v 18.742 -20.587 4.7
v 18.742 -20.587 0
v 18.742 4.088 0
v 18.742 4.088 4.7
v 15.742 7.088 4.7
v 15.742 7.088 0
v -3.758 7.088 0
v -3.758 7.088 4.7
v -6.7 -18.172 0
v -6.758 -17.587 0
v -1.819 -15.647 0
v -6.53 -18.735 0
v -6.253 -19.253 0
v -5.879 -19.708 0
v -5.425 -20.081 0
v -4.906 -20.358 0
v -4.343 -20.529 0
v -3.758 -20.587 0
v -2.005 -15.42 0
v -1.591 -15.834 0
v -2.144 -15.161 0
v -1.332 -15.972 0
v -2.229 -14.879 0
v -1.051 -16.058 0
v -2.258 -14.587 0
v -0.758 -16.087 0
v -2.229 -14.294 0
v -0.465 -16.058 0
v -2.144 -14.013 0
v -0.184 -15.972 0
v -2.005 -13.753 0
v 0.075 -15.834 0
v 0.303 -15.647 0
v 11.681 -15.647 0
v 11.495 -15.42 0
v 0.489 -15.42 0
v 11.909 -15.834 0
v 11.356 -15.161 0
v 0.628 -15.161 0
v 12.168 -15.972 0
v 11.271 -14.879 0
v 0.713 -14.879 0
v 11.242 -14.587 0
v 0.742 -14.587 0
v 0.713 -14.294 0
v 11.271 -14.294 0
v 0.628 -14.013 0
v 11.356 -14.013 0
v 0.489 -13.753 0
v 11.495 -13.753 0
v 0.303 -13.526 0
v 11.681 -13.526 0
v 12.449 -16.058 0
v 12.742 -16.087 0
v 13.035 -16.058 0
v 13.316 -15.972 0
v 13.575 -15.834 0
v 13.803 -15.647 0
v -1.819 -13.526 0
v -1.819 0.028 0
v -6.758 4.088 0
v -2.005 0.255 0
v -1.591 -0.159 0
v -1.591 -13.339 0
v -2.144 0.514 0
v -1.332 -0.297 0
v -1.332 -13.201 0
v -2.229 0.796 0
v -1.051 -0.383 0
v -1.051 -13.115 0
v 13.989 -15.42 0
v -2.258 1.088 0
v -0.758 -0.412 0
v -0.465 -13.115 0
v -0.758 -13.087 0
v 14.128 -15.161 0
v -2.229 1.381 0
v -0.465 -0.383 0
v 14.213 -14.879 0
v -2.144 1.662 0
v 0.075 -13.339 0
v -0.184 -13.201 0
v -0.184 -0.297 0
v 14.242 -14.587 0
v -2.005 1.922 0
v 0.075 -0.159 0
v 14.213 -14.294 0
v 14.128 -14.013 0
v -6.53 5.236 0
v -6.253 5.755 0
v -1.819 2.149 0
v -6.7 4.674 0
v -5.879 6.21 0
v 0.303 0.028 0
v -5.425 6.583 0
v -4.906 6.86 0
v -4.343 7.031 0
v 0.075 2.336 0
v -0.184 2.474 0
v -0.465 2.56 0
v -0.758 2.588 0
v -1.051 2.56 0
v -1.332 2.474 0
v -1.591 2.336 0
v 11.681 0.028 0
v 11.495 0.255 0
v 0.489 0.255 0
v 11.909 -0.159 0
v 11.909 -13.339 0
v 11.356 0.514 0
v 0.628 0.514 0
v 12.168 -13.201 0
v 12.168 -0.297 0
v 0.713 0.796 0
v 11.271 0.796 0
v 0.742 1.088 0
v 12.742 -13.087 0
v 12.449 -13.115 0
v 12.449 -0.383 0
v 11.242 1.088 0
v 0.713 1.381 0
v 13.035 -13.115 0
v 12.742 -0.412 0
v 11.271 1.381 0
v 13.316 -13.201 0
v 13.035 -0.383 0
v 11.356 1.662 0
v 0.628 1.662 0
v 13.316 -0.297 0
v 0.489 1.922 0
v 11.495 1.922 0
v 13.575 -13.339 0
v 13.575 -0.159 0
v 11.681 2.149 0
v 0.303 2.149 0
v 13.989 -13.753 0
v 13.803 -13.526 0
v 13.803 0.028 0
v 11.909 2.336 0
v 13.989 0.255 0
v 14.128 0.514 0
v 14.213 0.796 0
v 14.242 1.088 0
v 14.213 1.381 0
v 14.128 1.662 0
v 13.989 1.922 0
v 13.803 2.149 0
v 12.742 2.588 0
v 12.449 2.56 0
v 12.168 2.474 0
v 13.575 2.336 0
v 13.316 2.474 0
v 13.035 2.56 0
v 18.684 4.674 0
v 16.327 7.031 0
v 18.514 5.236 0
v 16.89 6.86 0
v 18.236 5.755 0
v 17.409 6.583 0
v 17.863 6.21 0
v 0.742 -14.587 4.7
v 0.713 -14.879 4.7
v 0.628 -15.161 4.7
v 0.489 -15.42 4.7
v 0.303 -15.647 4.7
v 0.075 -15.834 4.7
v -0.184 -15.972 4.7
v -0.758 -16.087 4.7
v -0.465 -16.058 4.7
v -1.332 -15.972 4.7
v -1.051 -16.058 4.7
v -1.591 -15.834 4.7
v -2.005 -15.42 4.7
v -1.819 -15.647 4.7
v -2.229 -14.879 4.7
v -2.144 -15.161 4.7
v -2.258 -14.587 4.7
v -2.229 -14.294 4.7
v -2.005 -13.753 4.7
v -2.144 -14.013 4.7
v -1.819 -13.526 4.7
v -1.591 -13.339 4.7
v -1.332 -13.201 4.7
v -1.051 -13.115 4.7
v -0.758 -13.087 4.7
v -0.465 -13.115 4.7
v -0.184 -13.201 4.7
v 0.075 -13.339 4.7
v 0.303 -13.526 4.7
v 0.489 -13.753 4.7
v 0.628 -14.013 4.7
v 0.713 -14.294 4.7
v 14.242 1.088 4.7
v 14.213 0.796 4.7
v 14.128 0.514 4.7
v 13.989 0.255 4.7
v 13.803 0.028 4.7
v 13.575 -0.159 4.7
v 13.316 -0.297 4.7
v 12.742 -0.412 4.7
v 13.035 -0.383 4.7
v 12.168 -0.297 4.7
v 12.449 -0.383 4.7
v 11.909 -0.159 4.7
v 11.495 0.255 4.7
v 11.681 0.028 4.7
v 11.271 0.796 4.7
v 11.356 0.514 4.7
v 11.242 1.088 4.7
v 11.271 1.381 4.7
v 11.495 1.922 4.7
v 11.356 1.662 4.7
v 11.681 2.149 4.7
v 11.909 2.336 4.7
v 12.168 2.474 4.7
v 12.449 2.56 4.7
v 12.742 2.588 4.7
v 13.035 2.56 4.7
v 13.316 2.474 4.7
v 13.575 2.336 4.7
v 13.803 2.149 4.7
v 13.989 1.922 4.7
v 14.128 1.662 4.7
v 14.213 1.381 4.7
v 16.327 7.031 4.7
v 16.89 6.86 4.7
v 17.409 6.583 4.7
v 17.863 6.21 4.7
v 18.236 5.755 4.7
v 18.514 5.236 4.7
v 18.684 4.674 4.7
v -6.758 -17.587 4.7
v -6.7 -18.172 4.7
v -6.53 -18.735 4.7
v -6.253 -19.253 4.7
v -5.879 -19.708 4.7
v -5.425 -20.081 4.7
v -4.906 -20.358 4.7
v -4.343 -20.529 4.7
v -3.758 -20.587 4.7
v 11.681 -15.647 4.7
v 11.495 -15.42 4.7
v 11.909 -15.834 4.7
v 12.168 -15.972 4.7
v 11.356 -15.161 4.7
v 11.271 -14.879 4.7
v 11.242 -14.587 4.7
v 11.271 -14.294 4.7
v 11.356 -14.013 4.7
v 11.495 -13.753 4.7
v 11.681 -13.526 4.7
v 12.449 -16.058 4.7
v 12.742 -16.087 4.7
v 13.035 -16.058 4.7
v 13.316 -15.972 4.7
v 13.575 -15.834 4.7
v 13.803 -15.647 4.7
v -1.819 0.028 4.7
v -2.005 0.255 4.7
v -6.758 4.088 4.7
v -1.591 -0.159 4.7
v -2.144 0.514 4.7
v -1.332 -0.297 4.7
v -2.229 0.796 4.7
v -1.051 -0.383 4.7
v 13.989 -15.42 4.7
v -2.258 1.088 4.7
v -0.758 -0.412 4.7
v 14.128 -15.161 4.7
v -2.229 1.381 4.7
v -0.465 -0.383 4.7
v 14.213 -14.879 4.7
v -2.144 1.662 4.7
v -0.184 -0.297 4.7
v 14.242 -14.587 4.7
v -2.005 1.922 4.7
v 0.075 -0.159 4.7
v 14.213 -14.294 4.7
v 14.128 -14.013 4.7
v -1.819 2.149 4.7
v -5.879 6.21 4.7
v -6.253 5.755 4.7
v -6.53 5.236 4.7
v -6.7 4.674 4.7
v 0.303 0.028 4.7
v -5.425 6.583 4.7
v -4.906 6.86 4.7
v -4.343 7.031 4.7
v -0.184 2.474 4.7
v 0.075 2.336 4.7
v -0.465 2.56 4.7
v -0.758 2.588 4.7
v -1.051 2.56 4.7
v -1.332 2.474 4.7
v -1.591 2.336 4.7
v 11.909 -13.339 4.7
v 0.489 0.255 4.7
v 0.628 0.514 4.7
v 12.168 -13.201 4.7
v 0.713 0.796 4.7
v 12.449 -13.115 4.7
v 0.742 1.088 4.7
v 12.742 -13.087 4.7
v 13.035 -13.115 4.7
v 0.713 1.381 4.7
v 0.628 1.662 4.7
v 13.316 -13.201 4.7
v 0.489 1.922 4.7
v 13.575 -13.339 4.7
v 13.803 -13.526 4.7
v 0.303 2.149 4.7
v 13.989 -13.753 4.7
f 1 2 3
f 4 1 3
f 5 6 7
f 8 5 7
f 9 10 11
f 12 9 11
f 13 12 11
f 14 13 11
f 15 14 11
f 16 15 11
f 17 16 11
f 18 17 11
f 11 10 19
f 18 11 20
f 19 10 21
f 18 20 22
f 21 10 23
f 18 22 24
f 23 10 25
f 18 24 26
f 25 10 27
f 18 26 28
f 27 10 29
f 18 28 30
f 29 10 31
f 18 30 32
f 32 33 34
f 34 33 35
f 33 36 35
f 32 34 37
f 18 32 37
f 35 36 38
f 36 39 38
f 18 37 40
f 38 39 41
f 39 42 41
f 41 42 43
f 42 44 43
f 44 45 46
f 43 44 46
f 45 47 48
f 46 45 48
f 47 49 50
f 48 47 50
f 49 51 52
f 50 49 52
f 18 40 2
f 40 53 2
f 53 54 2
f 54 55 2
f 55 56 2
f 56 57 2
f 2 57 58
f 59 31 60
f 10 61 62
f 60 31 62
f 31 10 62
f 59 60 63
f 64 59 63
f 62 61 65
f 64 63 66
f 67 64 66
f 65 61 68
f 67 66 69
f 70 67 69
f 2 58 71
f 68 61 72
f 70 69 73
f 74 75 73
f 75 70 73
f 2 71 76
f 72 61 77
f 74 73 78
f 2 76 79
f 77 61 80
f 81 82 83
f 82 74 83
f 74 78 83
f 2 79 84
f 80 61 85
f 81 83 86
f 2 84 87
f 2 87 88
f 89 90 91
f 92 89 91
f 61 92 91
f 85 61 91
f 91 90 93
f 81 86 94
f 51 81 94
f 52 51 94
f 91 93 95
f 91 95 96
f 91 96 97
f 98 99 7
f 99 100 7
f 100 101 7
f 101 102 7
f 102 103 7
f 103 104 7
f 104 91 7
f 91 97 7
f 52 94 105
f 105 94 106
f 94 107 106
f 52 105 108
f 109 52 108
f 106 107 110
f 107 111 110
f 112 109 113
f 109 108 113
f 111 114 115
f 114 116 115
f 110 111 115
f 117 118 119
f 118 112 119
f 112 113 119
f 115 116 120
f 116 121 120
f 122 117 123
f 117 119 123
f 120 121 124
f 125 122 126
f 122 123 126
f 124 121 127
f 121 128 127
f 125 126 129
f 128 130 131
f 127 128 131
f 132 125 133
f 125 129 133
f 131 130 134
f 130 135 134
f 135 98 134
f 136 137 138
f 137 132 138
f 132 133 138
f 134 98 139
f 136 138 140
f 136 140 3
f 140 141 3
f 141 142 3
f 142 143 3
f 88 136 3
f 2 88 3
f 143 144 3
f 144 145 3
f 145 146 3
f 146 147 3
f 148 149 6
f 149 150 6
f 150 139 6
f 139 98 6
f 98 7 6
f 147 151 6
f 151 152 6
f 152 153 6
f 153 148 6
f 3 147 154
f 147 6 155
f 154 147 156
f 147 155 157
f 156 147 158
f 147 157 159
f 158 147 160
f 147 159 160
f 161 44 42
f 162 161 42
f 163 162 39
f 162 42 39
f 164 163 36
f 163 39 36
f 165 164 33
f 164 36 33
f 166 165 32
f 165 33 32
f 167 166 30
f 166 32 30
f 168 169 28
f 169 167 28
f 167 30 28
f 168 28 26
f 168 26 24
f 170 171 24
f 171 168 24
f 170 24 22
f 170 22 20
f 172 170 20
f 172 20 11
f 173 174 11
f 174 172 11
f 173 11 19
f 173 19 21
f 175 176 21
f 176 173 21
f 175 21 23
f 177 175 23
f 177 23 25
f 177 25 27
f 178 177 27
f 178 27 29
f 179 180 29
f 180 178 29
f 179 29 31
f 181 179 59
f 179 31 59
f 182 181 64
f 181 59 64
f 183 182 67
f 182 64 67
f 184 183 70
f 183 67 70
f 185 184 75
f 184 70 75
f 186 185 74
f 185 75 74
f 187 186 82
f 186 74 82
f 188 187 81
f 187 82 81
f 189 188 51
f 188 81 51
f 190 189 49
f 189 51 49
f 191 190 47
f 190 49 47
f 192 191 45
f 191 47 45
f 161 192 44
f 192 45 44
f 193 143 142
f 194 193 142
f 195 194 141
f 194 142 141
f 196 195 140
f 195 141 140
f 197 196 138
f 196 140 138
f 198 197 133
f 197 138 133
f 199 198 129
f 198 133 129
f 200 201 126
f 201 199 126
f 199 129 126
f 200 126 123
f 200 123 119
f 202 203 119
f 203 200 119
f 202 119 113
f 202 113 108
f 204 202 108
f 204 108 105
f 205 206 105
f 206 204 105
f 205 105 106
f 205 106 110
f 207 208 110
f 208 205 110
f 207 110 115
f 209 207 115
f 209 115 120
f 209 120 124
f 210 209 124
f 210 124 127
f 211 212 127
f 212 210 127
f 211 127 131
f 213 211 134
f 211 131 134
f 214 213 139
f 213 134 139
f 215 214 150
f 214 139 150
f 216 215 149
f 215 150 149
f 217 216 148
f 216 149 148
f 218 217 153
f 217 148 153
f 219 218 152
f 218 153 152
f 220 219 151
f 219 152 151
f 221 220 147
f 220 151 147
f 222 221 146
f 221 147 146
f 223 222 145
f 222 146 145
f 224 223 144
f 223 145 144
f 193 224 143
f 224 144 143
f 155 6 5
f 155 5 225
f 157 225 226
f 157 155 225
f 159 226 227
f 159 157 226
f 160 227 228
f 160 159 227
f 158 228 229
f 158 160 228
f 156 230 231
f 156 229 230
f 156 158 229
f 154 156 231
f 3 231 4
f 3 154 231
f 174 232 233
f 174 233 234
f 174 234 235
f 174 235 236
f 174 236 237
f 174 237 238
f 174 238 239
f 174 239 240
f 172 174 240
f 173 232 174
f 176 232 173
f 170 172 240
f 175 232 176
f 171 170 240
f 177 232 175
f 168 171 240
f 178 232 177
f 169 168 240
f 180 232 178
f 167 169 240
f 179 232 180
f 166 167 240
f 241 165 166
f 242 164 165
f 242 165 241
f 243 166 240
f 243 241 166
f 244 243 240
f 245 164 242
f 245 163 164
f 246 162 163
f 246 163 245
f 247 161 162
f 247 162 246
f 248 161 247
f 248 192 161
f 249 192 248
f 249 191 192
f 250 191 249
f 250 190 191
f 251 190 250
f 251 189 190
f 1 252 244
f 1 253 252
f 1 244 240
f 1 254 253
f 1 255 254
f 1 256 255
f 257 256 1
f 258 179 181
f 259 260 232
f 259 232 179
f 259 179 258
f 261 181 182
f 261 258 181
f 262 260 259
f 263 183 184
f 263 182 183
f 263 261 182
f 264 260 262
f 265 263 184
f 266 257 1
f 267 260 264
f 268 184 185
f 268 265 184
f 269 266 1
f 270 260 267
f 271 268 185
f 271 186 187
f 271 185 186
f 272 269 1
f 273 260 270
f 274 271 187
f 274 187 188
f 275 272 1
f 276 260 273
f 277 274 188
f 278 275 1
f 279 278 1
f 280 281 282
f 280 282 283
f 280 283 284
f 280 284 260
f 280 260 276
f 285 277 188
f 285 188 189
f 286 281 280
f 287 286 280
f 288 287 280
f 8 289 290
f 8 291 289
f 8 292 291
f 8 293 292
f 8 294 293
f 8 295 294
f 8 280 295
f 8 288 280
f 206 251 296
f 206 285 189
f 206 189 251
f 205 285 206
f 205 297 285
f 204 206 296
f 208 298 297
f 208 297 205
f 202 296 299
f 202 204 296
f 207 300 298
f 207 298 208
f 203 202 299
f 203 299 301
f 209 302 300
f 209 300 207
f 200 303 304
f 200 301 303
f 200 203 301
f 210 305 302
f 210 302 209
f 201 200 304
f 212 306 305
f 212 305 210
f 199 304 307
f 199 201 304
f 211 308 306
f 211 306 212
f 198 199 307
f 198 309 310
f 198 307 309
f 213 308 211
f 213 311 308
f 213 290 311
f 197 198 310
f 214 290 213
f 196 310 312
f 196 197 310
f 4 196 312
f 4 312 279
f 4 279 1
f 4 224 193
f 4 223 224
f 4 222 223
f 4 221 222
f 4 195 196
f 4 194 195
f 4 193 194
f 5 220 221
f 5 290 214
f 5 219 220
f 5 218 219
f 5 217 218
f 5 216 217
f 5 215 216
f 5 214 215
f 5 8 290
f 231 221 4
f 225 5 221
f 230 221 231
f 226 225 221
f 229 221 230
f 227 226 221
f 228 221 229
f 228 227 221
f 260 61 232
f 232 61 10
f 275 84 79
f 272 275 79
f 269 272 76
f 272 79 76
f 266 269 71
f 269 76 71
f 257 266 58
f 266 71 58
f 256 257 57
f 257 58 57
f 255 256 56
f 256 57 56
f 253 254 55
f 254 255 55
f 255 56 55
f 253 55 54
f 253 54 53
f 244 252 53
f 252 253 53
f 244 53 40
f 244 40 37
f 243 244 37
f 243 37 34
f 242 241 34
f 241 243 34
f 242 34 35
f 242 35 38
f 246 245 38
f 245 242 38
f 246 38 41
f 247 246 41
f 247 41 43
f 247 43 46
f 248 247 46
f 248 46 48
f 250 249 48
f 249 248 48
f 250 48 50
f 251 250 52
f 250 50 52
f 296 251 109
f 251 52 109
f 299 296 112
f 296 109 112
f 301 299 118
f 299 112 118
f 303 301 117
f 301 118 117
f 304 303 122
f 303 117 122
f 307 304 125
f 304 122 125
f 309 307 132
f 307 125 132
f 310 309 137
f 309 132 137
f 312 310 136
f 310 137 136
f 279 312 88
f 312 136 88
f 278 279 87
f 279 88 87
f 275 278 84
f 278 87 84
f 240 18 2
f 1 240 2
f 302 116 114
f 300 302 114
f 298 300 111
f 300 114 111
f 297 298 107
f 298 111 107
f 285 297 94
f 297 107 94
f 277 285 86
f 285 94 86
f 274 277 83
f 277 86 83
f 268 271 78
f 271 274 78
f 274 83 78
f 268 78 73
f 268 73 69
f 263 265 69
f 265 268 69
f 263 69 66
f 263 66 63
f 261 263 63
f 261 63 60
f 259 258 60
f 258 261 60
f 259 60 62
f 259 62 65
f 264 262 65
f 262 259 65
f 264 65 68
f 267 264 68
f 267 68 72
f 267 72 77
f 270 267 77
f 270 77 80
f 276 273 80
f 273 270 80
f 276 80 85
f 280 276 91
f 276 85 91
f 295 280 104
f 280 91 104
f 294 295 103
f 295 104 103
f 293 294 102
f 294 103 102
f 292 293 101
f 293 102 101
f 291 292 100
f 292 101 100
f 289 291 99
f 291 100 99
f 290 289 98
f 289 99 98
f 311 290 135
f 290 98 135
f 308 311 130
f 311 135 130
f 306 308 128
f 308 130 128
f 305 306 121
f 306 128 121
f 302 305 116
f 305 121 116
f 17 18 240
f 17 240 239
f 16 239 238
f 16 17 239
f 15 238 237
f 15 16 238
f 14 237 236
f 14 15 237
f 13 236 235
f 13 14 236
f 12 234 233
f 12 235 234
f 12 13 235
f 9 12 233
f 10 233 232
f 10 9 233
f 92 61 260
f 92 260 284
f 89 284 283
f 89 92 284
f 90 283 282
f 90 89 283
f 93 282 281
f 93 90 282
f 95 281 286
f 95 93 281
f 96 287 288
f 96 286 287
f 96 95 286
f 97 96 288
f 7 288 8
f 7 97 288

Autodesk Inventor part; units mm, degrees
ref_plane "YZ Plane" through (0, 0, 0) normal (1, 0, 0) x (0, 1, 0)
ref_plane "XZ Plane" through (0, 0, 0) normal (0, 1, 0) x (-1, 0, 0)
ref_plane "XY Plane" through (0, 0, 0) normal (0, 0, 1) x (1, 0, 0)
sketch "Szkic1" plane through (0, 0, 0) normal (0, 0, 1) x (1, 0, 0)
  arc A0 (18.7419, 4.0884) -> (15.7419, 7.0884) centre (15.7419, 4.0884) ccw
  line L0 (15.7419, 7.0884) -> (-3.7581, 7.0884)
  arc A1 (-3.7581, 7.0884) -> (-6.7581, 4.0884) centre (-3.7581, 4.0884) ccw
  line L1 (-6.7581, 4.0884) -> (-6.7581, -17.5866)
  arc A2 (-6.7581, -17.5866) -> (-3.7581, -20.5866) centre (-3.7581, -17.5866) ccw
  line L2 (-3.7581, -20.5866) -> (18.7419, -20.5866)
  line L3 (18.7419, -20.5866) -> (18.7419, 4.0884)
  circle A3 centre (12.7419, -14.5866) radius 1.5
  circle A4 centre (12.7419, 1.0884) radius 1.5
  circle A5 centre (-0.7581, 1.0884) radius 1.5
  circle A6 centre (-0.7581, -14.5866) radius 1.5
  point P0 (0, 0)
  point P1 (0, 0)
extrude "Wyciągnięcie proste1" add sketch "Szkic1" along normal blind 4.7
properties part number "3DP_ABS_Induction_Sensor_Mount_Spacer"
